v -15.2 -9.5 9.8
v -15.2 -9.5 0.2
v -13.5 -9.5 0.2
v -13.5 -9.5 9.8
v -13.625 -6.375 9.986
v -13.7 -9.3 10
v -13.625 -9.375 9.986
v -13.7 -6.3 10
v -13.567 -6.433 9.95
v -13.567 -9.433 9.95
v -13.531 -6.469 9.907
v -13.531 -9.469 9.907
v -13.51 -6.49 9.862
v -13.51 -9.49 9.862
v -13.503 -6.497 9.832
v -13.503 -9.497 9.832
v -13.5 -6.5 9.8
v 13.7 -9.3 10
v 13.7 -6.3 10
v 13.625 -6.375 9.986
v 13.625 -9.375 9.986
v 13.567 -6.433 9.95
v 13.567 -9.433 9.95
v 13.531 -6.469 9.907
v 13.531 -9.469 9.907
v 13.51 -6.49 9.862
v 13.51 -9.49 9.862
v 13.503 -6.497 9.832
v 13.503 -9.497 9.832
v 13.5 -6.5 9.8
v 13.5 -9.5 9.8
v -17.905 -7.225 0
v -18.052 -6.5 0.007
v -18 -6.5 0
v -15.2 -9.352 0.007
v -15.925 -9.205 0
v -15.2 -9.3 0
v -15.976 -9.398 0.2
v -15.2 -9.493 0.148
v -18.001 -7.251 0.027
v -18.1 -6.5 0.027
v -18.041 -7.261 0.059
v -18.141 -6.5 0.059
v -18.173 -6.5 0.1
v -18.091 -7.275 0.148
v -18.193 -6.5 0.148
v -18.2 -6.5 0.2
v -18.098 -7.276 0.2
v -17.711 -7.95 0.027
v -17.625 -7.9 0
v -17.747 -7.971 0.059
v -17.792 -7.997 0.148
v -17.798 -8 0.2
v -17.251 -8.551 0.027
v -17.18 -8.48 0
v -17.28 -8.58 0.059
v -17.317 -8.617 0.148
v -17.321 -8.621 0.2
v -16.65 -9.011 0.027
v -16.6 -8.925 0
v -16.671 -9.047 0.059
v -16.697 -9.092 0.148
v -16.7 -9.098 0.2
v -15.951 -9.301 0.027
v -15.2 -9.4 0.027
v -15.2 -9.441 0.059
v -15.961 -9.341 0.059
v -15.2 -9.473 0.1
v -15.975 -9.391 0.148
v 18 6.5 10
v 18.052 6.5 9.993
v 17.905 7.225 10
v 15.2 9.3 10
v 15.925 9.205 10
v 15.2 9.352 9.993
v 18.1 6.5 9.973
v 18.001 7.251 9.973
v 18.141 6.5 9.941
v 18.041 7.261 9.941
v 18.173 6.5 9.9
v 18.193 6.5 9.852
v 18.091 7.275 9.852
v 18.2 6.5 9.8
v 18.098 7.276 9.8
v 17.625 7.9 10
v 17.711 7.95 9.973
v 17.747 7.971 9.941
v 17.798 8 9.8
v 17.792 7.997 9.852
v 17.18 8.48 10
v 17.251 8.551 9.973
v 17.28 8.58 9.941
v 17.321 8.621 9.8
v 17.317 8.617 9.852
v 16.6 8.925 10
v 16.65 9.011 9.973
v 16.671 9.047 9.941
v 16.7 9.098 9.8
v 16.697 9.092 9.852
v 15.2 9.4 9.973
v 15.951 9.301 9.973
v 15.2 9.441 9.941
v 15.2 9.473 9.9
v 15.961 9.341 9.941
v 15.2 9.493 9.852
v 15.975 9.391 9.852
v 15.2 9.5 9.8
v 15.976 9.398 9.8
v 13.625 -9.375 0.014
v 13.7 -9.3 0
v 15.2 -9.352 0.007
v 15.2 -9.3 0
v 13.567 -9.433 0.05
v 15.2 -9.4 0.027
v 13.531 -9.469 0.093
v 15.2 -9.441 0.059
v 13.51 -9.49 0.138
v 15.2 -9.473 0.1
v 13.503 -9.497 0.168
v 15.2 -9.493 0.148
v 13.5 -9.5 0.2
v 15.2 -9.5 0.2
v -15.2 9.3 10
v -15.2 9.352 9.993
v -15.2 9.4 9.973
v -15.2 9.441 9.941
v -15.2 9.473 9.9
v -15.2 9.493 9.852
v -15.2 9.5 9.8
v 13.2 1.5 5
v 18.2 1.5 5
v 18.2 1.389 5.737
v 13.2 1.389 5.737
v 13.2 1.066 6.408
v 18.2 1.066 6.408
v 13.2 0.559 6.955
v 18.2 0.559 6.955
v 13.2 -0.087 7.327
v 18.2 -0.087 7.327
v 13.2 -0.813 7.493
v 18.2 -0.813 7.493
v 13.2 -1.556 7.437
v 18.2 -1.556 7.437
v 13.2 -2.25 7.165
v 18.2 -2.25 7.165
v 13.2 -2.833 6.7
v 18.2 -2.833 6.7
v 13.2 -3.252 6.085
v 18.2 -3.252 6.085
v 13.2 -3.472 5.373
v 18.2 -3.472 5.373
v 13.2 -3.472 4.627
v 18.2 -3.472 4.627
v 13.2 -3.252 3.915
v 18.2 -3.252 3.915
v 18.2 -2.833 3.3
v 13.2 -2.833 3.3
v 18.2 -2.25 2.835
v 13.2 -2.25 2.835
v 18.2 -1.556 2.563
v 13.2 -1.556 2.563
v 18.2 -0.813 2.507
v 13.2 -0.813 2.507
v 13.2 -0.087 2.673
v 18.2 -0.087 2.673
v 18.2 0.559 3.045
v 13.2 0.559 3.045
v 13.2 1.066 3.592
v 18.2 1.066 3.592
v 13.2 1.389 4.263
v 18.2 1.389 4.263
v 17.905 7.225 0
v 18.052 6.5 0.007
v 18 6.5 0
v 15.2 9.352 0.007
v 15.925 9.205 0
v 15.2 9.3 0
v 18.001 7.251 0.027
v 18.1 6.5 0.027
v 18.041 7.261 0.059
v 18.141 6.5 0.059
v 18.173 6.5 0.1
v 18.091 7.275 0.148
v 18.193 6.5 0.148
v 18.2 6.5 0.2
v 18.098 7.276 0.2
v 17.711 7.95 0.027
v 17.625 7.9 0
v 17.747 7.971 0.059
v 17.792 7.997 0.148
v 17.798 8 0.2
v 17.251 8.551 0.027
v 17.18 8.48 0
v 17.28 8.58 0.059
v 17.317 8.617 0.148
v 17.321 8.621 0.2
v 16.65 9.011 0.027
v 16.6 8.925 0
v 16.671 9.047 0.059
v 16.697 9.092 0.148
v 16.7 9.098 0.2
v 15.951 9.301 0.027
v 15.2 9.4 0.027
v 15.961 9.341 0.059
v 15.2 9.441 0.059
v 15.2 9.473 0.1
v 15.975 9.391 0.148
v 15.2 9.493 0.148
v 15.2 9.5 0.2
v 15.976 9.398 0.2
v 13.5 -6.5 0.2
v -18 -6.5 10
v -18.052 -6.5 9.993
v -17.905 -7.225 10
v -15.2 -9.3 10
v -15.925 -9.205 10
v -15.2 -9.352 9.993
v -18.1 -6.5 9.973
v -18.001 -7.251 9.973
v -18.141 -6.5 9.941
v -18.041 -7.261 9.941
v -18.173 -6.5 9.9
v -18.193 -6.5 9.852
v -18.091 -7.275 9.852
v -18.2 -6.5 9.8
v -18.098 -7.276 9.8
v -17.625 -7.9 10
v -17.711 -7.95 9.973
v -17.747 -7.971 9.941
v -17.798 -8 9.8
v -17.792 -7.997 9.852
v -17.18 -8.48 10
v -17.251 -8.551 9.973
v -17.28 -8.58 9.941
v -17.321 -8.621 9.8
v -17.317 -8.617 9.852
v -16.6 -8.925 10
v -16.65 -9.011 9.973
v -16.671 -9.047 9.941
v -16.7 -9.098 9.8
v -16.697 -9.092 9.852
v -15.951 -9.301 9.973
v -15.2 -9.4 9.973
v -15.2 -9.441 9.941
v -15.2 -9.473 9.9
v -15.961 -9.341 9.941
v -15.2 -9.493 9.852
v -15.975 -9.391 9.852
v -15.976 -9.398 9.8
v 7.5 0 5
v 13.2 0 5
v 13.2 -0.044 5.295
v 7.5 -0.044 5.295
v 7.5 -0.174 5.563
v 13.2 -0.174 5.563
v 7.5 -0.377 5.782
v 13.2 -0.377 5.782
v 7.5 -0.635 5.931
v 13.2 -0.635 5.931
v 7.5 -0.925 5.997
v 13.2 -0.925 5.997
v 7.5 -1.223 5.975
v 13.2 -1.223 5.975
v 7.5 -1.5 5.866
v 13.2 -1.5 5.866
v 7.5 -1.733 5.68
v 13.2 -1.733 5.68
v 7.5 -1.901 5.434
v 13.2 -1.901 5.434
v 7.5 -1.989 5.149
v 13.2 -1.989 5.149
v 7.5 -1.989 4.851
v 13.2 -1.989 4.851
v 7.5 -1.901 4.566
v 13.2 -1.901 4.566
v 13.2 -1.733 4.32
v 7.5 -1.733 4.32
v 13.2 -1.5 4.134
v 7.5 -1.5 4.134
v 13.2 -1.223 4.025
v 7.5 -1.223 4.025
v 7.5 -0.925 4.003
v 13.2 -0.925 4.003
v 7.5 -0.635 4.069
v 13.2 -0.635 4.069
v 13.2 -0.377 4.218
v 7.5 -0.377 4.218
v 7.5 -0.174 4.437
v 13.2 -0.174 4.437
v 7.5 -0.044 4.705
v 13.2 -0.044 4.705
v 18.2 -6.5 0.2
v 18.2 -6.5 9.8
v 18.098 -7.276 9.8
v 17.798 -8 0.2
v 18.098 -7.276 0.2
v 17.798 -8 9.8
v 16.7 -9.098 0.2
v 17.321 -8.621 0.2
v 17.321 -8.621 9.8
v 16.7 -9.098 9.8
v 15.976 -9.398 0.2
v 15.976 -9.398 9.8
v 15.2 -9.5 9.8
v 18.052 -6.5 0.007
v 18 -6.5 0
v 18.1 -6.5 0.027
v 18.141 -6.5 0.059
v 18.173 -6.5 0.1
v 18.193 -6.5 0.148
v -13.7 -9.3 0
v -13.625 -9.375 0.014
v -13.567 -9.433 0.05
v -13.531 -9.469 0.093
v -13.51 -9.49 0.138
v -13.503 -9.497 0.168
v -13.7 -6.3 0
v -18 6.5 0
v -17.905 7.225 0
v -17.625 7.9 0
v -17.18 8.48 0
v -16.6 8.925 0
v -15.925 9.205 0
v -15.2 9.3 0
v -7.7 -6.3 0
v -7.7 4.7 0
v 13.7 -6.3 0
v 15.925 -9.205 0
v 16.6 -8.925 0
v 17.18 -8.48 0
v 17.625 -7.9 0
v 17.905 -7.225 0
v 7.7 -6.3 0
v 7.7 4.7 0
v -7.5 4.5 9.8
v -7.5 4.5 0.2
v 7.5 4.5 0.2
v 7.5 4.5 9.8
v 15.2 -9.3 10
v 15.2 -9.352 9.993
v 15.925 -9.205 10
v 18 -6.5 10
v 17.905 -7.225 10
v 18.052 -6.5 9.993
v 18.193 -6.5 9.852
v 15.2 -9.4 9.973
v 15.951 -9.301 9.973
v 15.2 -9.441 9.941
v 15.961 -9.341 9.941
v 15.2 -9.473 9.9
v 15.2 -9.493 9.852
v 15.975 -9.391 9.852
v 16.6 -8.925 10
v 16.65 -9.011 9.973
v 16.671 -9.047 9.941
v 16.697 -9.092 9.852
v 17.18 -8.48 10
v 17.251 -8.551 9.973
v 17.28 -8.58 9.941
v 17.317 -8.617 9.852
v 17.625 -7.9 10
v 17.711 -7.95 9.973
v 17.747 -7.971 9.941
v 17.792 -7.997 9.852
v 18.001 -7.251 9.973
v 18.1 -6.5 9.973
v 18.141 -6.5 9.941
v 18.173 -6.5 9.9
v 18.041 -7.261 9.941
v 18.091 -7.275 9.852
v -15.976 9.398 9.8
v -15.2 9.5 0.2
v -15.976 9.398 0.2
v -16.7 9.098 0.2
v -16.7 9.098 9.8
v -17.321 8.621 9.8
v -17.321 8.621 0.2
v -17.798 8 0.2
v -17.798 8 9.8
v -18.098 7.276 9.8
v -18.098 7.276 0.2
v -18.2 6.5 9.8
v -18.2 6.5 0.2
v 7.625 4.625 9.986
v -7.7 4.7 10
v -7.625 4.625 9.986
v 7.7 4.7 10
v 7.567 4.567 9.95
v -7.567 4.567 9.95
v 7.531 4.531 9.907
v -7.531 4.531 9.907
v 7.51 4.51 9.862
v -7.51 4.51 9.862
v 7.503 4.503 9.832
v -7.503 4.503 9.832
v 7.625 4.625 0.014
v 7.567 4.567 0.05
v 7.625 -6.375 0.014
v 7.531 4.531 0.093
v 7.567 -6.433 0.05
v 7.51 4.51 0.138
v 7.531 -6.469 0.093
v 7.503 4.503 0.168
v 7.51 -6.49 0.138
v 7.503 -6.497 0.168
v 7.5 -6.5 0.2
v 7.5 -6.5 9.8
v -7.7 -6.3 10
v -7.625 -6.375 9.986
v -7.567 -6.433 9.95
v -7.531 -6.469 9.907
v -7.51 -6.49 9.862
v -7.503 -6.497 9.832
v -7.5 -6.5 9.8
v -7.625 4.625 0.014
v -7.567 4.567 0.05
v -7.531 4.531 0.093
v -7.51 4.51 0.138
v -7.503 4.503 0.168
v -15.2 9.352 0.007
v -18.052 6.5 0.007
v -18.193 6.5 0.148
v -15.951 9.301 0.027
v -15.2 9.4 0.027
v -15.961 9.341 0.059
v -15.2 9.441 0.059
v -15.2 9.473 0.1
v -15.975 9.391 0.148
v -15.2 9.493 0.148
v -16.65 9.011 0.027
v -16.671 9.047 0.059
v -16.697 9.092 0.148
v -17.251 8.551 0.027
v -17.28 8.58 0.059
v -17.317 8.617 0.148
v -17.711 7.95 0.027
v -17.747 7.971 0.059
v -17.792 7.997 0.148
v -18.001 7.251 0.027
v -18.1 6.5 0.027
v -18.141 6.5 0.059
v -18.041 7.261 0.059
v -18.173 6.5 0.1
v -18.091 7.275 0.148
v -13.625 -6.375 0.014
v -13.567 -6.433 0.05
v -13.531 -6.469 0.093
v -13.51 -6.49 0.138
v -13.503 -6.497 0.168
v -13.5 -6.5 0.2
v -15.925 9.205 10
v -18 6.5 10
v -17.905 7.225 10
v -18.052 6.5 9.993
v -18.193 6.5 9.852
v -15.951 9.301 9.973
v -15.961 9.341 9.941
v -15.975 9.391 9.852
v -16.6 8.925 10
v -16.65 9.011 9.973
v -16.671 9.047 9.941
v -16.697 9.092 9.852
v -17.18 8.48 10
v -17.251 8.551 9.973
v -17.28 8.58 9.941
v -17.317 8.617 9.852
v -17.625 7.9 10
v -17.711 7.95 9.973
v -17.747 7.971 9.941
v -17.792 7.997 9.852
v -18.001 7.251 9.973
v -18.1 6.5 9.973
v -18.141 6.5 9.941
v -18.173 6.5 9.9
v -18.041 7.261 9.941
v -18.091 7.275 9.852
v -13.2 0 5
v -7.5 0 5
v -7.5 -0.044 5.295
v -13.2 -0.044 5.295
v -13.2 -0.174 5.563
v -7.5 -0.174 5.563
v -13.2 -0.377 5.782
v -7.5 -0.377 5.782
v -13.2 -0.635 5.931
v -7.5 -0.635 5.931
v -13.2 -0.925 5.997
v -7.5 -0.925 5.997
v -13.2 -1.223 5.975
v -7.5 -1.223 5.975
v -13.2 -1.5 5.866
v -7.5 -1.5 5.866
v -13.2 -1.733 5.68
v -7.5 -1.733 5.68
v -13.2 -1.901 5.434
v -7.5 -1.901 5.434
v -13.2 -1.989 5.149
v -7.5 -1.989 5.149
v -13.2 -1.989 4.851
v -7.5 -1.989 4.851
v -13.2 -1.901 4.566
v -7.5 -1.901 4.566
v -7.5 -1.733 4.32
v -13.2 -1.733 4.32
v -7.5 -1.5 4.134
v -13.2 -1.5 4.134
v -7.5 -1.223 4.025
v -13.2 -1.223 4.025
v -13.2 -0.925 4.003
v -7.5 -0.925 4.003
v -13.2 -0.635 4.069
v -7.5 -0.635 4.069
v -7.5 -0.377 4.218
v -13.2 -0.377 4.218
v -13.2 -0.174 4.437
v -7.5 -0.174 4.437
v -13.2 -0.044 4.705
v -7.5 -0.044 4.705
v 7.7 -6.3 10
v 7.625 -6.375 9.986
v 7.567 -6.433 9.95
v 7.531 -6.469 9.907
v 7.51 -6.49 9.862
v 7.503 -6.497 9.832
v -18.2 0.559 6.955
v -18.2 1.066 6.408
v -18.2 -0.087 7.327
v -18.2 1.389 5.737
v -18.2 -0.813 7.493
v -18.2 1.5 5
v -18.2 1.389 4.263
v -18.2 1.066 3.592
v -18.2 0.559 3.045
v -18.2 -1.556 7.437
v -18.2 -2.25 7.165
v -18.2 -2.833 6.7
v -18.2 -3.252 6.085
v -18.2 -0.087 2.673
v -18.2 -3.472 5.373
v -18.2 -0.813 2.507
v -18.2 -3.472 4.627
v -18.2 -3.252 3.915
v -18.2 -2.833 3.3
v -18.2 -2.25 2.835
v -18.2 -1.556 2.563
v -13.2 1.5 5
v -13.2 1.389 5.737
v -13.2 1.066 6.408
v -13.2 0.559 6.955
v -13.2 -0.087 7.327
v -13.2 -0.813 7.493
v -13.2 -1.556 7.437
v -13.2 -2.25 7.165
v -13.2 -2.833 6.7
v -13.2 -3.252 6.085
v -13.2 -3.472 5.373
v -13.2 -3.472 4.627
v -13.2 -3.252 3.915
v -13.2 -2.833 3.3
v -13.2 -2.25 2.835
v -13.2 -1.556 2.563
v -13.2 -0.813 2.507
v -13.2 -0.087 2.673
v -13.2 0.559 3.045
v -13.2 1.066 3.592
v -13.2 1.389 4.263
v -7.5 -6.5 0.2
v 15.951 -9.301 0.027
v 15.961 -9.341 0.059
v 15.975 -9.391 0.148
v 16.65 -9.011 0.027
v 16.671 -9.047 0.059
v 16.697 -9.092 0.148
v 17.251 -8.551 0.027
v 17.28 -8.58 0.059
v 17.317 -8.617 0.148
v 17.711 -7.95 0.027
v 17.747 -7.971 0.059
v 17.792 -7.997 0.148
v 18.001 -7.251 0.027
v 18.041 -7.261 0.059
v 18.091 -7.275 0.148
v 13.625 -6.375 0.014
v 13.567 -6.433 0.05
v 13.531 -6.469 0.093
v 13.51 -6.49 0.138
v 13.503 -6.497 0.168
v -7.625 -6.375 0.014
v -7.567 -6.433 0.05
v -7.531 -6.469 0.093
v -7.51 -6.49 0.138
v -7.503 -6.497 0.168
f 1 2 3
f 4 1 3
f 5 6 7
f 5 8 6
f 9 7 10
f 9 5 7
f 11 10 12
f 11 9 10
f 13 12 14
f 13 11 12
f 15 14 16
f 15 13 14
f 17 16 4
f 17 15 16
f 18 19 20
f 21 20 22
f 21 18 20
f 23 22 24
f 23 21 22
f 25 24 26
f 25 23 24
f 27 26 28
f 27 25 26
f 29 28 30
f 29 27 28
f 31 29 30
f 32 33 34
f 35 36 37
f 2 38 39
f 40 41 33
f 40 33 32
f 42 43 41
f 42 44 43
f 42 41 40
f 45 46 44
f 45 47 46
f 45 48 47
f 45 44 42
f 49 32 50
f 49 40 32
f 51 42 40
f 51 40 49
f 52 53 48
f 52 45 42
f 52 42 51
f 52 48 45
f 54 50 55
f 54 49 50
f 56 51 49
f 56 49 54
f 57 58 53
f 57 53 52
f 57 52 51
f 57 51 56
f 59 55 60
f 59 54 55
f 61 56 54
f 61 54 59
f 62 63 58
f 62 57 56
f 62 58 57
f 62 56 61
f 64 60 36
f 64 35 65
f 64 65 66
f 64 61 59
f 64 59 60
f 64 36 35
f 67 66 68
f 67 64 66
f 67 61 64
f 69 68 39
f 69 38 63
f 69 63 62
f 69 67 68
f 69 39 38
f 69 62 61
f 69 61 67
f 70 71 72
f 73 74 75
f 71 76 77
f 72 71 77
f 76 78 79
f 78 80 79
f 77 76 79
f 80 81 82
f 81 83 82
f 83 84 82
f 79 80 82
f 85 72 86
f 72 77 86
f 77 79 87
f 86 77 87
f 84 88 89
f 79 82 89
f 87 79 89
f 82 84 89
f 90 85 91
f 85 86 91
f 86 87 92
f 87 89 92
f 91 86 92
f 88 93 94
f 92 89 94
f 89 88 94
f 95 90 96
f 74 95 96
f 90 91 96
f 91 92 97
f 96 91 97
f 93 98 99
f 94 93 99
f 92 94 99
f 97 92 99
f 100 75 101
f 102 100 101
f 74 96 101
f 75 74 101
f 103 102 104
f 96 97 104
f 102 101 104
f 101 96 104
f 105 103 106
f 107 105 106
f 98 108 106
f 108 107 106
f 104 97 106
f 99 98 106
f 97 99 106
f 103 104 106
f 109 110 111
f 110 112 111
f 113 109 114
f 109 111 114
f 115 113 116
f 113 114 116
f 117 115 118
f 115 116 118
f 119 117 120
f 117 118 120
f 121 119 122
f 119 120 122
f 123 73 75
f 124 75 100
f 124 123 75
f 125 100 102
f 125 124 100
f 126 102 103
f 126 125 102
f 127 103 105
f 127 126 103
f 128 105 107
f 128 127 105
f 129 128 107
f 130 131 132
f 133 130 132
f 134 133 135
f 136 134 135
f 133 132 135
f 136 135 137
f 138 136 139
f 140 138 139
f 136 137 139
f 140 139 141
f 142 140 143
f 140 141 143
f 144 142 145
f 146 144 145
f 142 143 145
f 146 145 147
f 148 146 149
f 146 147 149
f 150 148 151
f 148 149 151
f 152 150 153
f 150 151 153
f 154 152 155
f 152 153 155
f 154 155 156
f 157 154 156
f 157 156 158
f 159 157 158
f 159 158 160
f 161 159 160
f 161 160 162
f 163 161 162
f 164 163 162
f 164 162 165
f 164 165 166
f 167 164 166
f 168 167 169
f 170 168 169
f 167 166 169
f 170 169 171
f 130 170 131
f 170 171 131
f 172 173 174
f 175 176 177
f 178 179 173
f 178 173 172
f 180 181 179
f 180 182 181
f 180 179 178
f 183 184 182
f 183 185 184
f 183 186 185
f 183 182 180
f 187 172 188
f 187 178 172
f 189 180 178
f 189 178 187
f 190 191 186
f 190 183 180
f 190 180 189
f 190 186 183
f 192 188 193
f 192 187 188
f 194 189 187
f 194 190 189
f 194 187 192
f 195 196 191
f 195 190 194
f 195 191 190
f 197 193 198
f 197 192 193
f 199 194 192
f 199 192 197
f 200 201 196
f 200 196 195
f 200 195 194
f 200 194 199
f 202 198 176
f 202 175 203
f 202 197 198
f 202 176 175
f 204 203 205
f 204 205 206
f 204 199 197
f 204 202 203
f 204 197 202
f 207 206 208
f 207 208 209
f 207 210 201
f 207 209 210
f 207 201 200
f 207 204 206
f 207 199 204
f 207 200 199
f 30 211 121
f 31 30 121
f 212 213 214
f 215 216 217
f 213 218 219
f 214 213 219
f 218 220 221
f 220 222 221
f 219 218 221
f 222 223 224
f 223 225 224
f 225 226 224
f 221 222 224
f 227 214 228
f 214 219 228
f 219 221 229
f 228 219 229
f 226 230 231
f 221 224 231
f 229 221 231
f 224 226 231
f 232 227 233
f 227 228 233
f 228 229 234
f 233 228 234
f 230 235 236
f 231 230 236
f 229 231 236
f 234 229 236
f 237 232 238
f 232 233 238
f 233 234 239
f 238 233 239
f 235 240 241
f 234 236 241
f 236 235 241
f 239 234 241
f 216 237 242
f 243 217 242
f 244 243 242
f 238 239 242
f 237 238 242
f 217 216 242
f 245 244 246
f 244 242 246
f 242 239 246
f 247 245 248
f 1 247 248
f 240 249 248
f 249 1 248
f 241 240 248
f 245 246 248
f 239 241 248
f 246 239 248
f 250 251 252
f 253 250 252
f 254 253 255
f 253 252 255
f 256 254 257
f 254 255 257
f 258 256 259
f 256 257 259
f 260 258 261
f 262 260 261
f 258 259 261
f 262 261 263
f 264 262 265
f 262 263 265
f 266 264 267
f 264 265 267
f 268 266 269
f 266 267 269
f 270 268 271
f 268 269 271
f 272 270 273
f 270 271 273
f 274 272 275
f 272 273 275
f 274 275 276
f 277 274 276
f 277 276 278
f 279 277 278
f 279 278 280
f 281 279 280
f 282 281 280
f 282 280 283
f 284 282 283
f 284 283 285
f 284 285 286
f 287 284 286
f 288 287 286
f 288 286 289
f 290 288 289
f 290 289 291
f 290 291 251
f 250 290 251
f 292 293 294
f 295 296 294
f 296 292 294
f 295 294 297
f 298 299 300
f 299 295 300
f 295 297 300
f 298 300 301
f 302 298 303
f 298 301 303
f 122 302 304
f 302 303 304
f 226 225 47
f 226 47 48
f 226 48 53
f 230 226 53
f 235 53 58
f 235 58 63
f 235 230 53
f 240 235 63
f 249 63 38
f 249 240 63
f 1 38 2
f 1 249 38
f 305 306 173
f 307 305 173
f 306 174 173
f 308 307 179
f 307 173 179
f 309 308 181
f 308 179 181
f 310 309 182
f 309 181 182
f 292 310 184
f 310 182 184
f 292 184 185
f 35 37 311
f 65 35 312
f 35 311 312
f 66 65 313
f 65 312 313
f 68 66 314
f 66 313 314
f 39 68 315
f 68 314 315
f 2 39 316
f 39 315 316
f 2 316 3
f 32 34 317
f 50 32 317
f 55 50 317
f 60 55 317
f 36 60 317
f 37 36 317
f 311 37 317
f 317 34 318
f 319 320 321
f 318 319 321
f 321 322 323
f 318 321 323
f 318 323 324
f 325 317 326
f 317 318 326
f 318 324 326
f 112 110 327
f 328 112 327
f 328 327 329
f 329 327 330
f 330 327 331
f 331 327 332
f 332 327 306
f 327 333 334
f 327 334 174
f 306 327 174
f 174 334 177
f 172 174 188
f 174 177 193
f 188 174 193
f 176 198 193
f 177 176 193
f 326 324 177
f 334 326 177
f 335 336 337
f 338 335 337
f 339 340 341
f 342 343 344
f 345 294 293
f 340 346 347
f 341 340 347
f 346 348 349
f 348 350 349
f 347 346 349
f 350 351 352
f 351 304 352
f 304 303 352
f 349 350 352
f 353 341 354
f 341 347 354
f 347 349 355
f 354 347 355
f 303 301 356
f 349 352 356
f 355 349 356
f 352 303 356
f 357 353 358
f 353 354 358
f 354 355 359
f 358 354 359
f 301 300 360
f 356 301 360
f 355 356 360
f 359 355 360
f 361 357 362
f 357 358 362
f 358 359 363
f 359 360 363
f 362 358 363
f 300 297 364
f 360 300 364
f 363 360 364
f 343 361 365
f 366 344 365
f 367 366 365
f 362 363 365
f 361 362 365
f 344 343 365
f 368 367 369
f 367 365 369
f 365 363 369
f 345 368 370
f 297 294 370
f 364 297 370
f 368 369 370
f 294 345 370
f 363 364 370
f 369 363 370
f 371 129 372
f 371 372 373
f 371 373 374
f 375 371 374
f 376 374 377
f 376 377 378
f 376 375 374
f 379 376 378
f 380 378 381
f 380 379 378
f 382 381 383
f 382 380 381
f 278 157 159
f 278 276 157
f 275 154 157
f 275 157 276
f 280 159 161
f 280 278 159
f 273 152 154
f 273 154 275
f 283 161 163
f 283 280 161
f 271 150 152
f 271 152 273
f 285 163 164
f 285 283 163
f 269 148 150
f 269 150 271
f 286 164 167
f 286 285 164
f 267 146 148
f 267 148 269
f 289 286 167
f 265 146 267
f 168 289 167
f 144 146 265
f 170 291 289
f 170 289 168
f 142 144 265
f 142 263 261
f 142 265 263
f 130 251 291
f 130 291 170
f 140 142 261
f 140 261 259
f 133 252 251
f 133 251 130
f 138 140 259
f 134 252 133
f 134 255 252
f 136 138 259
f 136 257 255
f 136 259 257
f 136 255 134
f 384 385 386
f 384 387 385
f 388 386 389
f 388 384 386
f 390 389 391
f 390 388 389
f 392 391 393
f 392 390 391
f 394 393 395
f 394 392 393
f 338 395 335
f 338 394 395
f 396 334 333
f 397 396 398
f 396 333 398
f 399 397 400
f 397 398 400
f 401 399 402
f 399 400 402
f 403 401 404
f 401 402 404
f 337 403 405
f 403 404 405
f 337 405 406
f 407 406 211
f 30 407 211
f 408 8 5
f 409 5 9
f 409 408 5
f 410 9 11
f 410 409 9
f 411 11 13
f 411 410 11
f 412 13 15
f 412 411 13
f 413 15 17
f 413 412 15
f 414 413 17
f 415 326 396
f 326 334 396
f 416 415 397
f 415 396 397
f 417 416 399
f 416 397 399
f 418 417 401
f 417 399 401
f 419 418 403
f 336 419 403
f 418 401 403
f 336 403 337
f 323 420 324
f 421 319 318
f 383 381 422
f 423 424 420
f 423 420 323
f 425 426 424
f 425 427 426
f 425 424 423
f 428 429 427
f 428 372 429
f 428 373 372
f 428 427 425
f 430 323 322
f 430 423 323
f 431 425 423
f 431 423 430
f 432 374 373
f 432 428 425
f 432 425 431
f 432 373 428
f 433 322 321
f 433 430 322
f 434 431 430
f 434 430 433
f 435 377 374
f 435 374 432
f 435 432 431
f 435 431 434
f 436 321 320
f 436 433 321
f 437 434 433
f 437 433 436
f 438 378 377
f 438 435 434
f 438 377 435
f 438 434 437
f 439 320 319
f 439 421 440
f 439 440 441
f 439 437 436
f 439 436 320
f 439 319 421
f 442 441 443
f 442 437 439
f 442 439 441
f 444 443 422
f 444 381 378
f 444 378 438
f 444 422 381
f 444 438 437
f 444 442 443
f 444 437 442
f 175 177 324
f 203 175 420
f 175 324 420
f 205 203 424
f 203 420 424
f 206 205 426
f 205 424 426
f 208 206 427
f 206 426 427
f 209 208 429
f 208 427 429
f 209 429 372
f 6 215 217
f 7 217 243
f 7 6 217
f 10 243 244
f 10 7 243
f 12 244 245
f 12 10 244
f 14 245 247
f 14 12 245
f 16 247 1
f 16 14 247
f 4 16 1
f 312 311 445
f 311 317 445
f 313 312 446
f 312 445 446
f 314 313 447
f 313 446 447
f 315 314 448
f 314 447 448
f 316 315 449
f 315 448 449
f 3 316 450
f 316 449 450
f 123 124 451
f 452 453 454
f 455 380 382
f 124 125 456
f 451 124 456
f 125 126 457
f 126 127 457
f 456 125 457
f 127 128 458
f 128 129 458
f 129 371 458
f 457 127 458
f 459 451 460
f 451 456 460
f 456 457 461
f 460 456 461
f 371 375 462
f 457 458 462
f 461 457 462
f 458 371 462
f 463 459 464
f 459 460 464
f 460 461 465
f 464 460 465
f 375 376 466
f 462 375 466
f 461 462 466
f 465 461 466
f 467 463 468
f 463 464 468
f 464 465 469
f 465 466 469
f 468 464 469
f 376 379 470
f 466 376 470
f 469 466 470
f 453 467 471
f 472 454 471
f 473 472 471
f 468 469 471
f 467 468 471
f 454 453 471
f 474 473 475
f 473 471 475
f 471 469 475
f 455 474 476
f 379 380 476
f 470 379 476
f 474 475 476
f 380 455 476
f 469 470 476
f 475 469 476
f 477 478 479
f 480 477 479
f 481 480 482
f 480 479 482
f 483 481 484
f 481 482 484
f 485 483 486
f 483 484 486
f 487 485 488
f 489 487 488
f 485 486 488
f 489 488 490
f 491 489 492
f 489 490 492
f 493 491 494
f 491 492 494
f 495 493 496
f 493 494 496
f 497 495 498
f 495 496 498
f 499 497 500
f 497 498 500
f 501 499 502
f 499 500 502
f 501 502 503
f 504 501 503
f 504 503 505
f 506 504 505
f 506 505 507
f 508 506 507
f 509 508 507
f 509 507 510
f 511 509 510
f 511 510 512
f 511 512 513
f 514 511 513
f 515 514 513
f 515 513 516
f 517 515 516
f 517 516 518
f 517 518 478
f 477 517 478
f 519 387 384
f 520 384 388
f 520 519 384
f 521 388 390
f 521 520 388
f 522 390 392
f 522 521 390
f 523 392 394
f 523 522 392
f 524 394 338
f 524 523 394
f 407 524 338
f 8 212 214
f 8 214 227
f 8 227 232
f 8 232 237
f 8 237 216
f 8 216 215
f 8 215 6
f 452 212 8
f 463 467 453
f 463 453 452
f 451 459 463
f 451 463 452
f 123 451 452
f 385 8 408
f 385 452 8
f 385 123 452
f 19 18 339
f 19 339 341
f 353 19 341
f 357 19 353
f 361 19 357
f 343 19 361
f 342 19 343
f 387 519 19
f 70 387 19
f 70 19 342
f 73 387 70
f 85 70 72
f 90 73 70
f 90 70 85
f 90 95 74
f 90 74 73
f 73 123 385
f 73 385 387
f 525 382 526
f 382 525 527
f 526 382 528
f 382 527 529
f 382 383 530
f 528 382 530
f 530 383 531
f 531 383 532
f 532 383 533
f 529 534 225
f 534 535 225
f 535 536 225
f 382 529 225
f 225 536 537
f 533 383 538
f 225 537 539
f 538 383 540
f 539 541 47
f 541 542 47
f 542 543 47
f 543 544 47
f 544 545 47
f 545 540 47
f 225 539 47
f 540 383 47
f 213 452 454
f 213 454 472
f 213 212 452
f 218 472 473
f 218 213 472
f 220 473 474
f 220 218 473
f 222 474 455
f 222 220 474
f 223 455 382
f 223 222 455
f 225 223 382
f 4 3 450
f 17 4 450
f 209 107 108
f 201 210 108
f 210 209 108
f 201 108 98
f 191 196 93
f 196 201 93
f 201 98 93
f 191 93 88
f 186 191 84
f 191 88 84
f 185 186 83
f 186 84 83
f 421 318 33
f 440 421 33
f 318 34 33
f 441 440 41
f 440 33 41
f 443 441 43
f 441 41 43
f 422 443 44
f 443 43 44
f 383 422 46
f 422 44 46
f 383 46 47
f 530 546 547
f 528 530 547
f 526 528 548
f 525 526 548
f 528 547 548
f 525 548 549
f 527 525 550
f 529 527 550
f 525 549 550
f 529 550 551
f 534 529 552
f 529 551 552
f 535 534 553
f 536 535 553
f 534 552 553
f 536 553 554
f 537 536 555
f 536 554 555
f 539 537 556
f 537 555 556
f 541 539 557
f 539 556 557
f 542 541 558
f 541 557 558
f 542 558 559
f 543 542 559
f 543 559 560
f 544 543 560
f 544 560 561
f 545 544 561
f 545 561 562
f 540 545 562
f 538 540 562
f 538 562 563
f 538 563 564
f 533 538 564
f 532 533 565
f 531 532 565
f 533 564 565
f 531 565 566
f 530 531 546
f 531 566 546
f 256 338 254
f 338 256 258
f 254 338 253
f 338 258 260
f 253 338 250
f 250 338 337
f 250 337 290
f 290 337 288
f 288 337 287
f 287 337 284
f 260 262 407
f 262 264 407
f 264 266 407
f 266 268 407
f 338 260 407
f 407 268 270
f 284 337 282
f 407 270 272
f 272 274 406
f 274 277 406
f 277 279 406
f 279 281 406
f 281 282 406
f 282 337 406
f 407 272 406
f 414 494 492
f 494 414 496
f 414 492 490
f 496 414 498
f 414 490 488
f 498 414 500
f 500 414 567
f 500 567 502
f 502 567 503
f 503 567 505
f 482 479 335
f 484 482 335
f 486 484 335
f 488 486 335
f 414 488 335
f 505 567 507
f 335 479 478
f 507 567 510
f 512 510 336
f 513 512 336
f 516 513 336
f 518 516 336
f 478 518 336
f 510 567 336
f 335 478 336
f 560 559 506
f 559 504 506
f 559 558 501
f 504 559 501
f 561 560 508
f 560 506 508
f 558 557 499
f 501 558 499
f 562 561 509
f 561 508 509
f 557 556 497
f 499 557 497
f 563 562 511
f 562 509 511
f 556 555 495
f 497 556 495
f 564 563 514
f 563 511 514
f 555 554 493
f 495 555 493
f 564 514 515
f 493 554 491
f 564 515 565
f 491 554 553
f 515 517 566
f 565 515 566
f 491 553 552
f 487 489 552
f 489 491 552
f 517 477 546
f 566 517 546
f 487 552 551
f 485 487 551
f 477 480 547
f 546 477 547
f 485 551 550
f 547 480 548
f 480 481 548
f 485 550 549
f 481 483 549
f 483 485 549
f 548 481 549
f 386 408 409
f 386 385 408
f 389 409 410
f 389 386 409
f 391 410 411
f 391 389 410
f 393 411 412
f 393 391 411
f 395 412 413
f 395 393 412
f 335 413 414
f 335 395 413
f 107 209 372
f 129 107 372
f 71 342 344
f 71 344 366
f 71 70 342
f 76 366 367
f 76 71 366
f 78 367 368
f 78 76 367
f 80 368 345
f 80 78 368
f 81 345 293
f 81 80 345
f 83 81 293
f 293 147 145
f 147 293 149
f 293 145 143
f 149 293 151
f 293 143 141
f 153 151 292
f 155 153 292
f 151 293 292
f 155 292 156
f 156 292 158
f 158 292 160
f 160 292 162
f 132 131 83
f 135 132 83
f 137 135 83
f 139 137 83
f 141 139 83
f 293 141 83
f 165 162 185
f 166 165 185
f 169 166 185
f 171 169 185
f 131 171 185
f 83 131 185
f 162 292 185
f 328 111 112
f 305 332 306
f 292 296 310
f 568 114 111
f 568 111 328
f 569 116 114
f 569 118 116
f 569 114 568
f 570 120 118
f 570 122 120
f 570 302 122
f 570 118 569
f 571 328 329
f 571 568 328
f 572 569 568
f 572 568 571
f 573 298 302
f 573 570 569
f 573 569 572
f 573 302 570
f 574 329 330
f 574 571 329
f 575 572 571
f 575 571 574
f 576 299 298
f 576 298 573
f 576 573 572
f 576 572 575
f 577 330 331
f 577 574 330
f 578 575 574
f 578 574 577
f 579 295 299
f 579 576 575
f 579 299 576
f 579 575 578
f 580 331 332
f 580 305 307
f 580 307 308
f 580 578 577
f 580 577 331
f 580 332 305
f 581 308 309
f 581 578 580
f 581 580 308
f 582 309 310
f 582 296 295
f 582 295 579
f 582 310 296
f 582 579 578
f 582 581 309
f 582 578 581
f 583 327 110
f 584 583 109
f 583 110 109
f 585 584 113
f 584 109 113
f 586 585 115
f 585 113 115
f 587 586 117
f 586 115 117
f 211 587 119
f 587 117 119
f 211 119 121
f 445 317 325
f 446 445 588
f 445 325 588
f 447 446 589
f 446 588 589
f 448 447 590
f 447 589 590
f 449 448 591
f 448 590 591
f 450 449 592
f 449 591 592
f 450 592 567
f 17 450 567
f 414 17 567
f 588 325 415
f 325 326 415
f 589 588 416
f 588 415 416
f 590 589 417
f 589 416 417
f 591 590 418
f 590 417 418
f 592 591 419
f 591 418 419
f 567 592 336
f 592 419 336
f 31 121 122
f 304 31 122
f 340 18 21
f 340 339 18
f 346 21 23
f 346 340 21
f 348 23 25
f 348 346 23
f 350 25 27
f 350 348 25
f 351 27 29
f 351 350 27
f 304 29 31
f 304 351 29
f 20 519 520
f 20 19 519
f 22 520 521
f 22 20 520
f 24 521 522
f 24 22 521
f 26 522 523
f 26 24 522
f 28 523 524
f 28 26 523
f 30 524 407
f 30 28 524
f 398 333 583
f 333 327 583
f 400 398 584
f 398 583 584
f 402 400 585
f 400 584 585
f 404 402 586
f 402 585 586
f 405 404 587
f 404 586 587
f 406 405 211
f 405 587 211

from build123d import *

# Parameters (mm, degrees)
EXTRUDE_1_DEPTH     = 10
SKETCH_2_R          = 1
CUT_EXTRUDE_1_DEPTH = 39.925698452
SKETCH_3_R          = 2.5
CUT_EXTRUDE_2_DEPTH = 5
CUT_EXTRUDE_START   = -31.4
SKETCH_3_2_R        = 2.5
CUT_EXTRUDE_3_DEPTH = 5
FILLET_1_R          = 3
FILLET_2_R          = 0.2


with BuildPart() as part:
    # 스케치1 → 보스-돌출1 (new body)
    with BuildSketch(Plane.XY):
        Polygon((18.2, 9.5), (-18.2, 9.5), (-18.2, -9.5), (-13.5, -9.5), (-13.5, -6.5), (-7.5, -6.5), (-7.5, 4.5), (7.5, 4.5), (7.5, -6.5), (13.5, -6.5), (13.5, -9.5), (18.2, -9.5), align=None)
    extrude(amount=EXTRUDE_1_DEPTH)

    # 스케치2 → 컷-돌출1 (cut, through all)
    with BuildSketch(Plane(origin=(18.2, 0, 0), x_dir=(0, 0, -1), z_dir=(1, 0, 0))):
        with Locations(Location((-5, -1, 0), (0, 0, 90))):
            Circle(SKETCH_2_R)
    extrude(amount=-CUT_EXTRUDE_1_DEPTH, mode=Mode.SUBTRACT)

    # 스케치3 → 컷-돌출2 (cut)
    with BuildSketch(Plane(origin=(18.2, 0, 0), x_dir=(0, 0, -1), z_dir=(1, 0, 0))):
        with Locations(Location((-5, -1, 0), (0, 0, 90))):
            Circle(SKETCH_3_R)
    extrude(amount=-CUT_EXTRUDE_2_DEPTH, mode=Mode.SUBTRACT)

    # 스케치3<2> → 컷-돌출3 (cut)
    with BuildSketch(Plane(origin=(18.2, 0, 0), x_dir=(0, 0, -1), z_dir=(1, 0, 0)).offset(CUT_EXTRUDE_START)):
        with Locations(Location((-5, -1, 0), (0, 0, 90))):
            Circle(SKETCH_3_2_R)
    extrude(amount=-CUT_EXTRUDE_3_DEPTH, mode=Mode.SUBTRACT)

    # 필렛1
    fillet_1_edges = [part.edges().sort_by_distance(p)[0] for p in [
        (-18.2, -9.5, 5),
        (-18.2, 9.5, 5),
        (18.2, 9.5, 5),
        (18.2, -9.5, 5),
    ]]
    fillet(fillet_1_edges, radius=FILLET_1_R)

    # 필렛2
    fillet_2_edges = [part.edges().sort_by_distance(p)[0] for p in [
        (14.35, -9.5, 10),
        (10.5, -6.5, 0),
        (7.5, -1, 0),
        (0, 4.5, 0),
        (-7.5, -1, 0),
        (-10.5, -6.5, 0),
        (-13.5, -8, 0),
        (14.35, -9.5, 0),
        (13.5, -8, 0),
        (-13.5, -8, 10),
        (-10.5, -6.5, 10),
        (-7.5, -1, 10),
        (0, 4.5, 10),
        (7.5, -1, 10),
        (-14.35, -9.5, 0),
        (-14.35, -9.5, 10),
        (10.5, -6.5, 10),
        (-18.2, 0, 0),
        (13.5, -8, 10),
        (0, 9.5, 0),
        (18.2, 0, 0),
        (17.321320344, 8.621320344, 0),
        (-17.321320344, 8.621320344, 0),
        (17.321320344, -8.621320344, 0),
        (-17.321320344, -8.621320344, 0),
        (-18.2, 0, 10),
        (18.2, 0, 10),
        (0, 9.5, 10),
        (17.321320344, 8.621320344, 10),
        (-17.321320344, 8.621320344, 10),
        (17.321320344, -8.621320344, 10),
        (-17.321320344, -8.621320344, 10),
    ]]
    fillet(fillet_2_edges, radius=FILLET_2_R)


solid = part.part
